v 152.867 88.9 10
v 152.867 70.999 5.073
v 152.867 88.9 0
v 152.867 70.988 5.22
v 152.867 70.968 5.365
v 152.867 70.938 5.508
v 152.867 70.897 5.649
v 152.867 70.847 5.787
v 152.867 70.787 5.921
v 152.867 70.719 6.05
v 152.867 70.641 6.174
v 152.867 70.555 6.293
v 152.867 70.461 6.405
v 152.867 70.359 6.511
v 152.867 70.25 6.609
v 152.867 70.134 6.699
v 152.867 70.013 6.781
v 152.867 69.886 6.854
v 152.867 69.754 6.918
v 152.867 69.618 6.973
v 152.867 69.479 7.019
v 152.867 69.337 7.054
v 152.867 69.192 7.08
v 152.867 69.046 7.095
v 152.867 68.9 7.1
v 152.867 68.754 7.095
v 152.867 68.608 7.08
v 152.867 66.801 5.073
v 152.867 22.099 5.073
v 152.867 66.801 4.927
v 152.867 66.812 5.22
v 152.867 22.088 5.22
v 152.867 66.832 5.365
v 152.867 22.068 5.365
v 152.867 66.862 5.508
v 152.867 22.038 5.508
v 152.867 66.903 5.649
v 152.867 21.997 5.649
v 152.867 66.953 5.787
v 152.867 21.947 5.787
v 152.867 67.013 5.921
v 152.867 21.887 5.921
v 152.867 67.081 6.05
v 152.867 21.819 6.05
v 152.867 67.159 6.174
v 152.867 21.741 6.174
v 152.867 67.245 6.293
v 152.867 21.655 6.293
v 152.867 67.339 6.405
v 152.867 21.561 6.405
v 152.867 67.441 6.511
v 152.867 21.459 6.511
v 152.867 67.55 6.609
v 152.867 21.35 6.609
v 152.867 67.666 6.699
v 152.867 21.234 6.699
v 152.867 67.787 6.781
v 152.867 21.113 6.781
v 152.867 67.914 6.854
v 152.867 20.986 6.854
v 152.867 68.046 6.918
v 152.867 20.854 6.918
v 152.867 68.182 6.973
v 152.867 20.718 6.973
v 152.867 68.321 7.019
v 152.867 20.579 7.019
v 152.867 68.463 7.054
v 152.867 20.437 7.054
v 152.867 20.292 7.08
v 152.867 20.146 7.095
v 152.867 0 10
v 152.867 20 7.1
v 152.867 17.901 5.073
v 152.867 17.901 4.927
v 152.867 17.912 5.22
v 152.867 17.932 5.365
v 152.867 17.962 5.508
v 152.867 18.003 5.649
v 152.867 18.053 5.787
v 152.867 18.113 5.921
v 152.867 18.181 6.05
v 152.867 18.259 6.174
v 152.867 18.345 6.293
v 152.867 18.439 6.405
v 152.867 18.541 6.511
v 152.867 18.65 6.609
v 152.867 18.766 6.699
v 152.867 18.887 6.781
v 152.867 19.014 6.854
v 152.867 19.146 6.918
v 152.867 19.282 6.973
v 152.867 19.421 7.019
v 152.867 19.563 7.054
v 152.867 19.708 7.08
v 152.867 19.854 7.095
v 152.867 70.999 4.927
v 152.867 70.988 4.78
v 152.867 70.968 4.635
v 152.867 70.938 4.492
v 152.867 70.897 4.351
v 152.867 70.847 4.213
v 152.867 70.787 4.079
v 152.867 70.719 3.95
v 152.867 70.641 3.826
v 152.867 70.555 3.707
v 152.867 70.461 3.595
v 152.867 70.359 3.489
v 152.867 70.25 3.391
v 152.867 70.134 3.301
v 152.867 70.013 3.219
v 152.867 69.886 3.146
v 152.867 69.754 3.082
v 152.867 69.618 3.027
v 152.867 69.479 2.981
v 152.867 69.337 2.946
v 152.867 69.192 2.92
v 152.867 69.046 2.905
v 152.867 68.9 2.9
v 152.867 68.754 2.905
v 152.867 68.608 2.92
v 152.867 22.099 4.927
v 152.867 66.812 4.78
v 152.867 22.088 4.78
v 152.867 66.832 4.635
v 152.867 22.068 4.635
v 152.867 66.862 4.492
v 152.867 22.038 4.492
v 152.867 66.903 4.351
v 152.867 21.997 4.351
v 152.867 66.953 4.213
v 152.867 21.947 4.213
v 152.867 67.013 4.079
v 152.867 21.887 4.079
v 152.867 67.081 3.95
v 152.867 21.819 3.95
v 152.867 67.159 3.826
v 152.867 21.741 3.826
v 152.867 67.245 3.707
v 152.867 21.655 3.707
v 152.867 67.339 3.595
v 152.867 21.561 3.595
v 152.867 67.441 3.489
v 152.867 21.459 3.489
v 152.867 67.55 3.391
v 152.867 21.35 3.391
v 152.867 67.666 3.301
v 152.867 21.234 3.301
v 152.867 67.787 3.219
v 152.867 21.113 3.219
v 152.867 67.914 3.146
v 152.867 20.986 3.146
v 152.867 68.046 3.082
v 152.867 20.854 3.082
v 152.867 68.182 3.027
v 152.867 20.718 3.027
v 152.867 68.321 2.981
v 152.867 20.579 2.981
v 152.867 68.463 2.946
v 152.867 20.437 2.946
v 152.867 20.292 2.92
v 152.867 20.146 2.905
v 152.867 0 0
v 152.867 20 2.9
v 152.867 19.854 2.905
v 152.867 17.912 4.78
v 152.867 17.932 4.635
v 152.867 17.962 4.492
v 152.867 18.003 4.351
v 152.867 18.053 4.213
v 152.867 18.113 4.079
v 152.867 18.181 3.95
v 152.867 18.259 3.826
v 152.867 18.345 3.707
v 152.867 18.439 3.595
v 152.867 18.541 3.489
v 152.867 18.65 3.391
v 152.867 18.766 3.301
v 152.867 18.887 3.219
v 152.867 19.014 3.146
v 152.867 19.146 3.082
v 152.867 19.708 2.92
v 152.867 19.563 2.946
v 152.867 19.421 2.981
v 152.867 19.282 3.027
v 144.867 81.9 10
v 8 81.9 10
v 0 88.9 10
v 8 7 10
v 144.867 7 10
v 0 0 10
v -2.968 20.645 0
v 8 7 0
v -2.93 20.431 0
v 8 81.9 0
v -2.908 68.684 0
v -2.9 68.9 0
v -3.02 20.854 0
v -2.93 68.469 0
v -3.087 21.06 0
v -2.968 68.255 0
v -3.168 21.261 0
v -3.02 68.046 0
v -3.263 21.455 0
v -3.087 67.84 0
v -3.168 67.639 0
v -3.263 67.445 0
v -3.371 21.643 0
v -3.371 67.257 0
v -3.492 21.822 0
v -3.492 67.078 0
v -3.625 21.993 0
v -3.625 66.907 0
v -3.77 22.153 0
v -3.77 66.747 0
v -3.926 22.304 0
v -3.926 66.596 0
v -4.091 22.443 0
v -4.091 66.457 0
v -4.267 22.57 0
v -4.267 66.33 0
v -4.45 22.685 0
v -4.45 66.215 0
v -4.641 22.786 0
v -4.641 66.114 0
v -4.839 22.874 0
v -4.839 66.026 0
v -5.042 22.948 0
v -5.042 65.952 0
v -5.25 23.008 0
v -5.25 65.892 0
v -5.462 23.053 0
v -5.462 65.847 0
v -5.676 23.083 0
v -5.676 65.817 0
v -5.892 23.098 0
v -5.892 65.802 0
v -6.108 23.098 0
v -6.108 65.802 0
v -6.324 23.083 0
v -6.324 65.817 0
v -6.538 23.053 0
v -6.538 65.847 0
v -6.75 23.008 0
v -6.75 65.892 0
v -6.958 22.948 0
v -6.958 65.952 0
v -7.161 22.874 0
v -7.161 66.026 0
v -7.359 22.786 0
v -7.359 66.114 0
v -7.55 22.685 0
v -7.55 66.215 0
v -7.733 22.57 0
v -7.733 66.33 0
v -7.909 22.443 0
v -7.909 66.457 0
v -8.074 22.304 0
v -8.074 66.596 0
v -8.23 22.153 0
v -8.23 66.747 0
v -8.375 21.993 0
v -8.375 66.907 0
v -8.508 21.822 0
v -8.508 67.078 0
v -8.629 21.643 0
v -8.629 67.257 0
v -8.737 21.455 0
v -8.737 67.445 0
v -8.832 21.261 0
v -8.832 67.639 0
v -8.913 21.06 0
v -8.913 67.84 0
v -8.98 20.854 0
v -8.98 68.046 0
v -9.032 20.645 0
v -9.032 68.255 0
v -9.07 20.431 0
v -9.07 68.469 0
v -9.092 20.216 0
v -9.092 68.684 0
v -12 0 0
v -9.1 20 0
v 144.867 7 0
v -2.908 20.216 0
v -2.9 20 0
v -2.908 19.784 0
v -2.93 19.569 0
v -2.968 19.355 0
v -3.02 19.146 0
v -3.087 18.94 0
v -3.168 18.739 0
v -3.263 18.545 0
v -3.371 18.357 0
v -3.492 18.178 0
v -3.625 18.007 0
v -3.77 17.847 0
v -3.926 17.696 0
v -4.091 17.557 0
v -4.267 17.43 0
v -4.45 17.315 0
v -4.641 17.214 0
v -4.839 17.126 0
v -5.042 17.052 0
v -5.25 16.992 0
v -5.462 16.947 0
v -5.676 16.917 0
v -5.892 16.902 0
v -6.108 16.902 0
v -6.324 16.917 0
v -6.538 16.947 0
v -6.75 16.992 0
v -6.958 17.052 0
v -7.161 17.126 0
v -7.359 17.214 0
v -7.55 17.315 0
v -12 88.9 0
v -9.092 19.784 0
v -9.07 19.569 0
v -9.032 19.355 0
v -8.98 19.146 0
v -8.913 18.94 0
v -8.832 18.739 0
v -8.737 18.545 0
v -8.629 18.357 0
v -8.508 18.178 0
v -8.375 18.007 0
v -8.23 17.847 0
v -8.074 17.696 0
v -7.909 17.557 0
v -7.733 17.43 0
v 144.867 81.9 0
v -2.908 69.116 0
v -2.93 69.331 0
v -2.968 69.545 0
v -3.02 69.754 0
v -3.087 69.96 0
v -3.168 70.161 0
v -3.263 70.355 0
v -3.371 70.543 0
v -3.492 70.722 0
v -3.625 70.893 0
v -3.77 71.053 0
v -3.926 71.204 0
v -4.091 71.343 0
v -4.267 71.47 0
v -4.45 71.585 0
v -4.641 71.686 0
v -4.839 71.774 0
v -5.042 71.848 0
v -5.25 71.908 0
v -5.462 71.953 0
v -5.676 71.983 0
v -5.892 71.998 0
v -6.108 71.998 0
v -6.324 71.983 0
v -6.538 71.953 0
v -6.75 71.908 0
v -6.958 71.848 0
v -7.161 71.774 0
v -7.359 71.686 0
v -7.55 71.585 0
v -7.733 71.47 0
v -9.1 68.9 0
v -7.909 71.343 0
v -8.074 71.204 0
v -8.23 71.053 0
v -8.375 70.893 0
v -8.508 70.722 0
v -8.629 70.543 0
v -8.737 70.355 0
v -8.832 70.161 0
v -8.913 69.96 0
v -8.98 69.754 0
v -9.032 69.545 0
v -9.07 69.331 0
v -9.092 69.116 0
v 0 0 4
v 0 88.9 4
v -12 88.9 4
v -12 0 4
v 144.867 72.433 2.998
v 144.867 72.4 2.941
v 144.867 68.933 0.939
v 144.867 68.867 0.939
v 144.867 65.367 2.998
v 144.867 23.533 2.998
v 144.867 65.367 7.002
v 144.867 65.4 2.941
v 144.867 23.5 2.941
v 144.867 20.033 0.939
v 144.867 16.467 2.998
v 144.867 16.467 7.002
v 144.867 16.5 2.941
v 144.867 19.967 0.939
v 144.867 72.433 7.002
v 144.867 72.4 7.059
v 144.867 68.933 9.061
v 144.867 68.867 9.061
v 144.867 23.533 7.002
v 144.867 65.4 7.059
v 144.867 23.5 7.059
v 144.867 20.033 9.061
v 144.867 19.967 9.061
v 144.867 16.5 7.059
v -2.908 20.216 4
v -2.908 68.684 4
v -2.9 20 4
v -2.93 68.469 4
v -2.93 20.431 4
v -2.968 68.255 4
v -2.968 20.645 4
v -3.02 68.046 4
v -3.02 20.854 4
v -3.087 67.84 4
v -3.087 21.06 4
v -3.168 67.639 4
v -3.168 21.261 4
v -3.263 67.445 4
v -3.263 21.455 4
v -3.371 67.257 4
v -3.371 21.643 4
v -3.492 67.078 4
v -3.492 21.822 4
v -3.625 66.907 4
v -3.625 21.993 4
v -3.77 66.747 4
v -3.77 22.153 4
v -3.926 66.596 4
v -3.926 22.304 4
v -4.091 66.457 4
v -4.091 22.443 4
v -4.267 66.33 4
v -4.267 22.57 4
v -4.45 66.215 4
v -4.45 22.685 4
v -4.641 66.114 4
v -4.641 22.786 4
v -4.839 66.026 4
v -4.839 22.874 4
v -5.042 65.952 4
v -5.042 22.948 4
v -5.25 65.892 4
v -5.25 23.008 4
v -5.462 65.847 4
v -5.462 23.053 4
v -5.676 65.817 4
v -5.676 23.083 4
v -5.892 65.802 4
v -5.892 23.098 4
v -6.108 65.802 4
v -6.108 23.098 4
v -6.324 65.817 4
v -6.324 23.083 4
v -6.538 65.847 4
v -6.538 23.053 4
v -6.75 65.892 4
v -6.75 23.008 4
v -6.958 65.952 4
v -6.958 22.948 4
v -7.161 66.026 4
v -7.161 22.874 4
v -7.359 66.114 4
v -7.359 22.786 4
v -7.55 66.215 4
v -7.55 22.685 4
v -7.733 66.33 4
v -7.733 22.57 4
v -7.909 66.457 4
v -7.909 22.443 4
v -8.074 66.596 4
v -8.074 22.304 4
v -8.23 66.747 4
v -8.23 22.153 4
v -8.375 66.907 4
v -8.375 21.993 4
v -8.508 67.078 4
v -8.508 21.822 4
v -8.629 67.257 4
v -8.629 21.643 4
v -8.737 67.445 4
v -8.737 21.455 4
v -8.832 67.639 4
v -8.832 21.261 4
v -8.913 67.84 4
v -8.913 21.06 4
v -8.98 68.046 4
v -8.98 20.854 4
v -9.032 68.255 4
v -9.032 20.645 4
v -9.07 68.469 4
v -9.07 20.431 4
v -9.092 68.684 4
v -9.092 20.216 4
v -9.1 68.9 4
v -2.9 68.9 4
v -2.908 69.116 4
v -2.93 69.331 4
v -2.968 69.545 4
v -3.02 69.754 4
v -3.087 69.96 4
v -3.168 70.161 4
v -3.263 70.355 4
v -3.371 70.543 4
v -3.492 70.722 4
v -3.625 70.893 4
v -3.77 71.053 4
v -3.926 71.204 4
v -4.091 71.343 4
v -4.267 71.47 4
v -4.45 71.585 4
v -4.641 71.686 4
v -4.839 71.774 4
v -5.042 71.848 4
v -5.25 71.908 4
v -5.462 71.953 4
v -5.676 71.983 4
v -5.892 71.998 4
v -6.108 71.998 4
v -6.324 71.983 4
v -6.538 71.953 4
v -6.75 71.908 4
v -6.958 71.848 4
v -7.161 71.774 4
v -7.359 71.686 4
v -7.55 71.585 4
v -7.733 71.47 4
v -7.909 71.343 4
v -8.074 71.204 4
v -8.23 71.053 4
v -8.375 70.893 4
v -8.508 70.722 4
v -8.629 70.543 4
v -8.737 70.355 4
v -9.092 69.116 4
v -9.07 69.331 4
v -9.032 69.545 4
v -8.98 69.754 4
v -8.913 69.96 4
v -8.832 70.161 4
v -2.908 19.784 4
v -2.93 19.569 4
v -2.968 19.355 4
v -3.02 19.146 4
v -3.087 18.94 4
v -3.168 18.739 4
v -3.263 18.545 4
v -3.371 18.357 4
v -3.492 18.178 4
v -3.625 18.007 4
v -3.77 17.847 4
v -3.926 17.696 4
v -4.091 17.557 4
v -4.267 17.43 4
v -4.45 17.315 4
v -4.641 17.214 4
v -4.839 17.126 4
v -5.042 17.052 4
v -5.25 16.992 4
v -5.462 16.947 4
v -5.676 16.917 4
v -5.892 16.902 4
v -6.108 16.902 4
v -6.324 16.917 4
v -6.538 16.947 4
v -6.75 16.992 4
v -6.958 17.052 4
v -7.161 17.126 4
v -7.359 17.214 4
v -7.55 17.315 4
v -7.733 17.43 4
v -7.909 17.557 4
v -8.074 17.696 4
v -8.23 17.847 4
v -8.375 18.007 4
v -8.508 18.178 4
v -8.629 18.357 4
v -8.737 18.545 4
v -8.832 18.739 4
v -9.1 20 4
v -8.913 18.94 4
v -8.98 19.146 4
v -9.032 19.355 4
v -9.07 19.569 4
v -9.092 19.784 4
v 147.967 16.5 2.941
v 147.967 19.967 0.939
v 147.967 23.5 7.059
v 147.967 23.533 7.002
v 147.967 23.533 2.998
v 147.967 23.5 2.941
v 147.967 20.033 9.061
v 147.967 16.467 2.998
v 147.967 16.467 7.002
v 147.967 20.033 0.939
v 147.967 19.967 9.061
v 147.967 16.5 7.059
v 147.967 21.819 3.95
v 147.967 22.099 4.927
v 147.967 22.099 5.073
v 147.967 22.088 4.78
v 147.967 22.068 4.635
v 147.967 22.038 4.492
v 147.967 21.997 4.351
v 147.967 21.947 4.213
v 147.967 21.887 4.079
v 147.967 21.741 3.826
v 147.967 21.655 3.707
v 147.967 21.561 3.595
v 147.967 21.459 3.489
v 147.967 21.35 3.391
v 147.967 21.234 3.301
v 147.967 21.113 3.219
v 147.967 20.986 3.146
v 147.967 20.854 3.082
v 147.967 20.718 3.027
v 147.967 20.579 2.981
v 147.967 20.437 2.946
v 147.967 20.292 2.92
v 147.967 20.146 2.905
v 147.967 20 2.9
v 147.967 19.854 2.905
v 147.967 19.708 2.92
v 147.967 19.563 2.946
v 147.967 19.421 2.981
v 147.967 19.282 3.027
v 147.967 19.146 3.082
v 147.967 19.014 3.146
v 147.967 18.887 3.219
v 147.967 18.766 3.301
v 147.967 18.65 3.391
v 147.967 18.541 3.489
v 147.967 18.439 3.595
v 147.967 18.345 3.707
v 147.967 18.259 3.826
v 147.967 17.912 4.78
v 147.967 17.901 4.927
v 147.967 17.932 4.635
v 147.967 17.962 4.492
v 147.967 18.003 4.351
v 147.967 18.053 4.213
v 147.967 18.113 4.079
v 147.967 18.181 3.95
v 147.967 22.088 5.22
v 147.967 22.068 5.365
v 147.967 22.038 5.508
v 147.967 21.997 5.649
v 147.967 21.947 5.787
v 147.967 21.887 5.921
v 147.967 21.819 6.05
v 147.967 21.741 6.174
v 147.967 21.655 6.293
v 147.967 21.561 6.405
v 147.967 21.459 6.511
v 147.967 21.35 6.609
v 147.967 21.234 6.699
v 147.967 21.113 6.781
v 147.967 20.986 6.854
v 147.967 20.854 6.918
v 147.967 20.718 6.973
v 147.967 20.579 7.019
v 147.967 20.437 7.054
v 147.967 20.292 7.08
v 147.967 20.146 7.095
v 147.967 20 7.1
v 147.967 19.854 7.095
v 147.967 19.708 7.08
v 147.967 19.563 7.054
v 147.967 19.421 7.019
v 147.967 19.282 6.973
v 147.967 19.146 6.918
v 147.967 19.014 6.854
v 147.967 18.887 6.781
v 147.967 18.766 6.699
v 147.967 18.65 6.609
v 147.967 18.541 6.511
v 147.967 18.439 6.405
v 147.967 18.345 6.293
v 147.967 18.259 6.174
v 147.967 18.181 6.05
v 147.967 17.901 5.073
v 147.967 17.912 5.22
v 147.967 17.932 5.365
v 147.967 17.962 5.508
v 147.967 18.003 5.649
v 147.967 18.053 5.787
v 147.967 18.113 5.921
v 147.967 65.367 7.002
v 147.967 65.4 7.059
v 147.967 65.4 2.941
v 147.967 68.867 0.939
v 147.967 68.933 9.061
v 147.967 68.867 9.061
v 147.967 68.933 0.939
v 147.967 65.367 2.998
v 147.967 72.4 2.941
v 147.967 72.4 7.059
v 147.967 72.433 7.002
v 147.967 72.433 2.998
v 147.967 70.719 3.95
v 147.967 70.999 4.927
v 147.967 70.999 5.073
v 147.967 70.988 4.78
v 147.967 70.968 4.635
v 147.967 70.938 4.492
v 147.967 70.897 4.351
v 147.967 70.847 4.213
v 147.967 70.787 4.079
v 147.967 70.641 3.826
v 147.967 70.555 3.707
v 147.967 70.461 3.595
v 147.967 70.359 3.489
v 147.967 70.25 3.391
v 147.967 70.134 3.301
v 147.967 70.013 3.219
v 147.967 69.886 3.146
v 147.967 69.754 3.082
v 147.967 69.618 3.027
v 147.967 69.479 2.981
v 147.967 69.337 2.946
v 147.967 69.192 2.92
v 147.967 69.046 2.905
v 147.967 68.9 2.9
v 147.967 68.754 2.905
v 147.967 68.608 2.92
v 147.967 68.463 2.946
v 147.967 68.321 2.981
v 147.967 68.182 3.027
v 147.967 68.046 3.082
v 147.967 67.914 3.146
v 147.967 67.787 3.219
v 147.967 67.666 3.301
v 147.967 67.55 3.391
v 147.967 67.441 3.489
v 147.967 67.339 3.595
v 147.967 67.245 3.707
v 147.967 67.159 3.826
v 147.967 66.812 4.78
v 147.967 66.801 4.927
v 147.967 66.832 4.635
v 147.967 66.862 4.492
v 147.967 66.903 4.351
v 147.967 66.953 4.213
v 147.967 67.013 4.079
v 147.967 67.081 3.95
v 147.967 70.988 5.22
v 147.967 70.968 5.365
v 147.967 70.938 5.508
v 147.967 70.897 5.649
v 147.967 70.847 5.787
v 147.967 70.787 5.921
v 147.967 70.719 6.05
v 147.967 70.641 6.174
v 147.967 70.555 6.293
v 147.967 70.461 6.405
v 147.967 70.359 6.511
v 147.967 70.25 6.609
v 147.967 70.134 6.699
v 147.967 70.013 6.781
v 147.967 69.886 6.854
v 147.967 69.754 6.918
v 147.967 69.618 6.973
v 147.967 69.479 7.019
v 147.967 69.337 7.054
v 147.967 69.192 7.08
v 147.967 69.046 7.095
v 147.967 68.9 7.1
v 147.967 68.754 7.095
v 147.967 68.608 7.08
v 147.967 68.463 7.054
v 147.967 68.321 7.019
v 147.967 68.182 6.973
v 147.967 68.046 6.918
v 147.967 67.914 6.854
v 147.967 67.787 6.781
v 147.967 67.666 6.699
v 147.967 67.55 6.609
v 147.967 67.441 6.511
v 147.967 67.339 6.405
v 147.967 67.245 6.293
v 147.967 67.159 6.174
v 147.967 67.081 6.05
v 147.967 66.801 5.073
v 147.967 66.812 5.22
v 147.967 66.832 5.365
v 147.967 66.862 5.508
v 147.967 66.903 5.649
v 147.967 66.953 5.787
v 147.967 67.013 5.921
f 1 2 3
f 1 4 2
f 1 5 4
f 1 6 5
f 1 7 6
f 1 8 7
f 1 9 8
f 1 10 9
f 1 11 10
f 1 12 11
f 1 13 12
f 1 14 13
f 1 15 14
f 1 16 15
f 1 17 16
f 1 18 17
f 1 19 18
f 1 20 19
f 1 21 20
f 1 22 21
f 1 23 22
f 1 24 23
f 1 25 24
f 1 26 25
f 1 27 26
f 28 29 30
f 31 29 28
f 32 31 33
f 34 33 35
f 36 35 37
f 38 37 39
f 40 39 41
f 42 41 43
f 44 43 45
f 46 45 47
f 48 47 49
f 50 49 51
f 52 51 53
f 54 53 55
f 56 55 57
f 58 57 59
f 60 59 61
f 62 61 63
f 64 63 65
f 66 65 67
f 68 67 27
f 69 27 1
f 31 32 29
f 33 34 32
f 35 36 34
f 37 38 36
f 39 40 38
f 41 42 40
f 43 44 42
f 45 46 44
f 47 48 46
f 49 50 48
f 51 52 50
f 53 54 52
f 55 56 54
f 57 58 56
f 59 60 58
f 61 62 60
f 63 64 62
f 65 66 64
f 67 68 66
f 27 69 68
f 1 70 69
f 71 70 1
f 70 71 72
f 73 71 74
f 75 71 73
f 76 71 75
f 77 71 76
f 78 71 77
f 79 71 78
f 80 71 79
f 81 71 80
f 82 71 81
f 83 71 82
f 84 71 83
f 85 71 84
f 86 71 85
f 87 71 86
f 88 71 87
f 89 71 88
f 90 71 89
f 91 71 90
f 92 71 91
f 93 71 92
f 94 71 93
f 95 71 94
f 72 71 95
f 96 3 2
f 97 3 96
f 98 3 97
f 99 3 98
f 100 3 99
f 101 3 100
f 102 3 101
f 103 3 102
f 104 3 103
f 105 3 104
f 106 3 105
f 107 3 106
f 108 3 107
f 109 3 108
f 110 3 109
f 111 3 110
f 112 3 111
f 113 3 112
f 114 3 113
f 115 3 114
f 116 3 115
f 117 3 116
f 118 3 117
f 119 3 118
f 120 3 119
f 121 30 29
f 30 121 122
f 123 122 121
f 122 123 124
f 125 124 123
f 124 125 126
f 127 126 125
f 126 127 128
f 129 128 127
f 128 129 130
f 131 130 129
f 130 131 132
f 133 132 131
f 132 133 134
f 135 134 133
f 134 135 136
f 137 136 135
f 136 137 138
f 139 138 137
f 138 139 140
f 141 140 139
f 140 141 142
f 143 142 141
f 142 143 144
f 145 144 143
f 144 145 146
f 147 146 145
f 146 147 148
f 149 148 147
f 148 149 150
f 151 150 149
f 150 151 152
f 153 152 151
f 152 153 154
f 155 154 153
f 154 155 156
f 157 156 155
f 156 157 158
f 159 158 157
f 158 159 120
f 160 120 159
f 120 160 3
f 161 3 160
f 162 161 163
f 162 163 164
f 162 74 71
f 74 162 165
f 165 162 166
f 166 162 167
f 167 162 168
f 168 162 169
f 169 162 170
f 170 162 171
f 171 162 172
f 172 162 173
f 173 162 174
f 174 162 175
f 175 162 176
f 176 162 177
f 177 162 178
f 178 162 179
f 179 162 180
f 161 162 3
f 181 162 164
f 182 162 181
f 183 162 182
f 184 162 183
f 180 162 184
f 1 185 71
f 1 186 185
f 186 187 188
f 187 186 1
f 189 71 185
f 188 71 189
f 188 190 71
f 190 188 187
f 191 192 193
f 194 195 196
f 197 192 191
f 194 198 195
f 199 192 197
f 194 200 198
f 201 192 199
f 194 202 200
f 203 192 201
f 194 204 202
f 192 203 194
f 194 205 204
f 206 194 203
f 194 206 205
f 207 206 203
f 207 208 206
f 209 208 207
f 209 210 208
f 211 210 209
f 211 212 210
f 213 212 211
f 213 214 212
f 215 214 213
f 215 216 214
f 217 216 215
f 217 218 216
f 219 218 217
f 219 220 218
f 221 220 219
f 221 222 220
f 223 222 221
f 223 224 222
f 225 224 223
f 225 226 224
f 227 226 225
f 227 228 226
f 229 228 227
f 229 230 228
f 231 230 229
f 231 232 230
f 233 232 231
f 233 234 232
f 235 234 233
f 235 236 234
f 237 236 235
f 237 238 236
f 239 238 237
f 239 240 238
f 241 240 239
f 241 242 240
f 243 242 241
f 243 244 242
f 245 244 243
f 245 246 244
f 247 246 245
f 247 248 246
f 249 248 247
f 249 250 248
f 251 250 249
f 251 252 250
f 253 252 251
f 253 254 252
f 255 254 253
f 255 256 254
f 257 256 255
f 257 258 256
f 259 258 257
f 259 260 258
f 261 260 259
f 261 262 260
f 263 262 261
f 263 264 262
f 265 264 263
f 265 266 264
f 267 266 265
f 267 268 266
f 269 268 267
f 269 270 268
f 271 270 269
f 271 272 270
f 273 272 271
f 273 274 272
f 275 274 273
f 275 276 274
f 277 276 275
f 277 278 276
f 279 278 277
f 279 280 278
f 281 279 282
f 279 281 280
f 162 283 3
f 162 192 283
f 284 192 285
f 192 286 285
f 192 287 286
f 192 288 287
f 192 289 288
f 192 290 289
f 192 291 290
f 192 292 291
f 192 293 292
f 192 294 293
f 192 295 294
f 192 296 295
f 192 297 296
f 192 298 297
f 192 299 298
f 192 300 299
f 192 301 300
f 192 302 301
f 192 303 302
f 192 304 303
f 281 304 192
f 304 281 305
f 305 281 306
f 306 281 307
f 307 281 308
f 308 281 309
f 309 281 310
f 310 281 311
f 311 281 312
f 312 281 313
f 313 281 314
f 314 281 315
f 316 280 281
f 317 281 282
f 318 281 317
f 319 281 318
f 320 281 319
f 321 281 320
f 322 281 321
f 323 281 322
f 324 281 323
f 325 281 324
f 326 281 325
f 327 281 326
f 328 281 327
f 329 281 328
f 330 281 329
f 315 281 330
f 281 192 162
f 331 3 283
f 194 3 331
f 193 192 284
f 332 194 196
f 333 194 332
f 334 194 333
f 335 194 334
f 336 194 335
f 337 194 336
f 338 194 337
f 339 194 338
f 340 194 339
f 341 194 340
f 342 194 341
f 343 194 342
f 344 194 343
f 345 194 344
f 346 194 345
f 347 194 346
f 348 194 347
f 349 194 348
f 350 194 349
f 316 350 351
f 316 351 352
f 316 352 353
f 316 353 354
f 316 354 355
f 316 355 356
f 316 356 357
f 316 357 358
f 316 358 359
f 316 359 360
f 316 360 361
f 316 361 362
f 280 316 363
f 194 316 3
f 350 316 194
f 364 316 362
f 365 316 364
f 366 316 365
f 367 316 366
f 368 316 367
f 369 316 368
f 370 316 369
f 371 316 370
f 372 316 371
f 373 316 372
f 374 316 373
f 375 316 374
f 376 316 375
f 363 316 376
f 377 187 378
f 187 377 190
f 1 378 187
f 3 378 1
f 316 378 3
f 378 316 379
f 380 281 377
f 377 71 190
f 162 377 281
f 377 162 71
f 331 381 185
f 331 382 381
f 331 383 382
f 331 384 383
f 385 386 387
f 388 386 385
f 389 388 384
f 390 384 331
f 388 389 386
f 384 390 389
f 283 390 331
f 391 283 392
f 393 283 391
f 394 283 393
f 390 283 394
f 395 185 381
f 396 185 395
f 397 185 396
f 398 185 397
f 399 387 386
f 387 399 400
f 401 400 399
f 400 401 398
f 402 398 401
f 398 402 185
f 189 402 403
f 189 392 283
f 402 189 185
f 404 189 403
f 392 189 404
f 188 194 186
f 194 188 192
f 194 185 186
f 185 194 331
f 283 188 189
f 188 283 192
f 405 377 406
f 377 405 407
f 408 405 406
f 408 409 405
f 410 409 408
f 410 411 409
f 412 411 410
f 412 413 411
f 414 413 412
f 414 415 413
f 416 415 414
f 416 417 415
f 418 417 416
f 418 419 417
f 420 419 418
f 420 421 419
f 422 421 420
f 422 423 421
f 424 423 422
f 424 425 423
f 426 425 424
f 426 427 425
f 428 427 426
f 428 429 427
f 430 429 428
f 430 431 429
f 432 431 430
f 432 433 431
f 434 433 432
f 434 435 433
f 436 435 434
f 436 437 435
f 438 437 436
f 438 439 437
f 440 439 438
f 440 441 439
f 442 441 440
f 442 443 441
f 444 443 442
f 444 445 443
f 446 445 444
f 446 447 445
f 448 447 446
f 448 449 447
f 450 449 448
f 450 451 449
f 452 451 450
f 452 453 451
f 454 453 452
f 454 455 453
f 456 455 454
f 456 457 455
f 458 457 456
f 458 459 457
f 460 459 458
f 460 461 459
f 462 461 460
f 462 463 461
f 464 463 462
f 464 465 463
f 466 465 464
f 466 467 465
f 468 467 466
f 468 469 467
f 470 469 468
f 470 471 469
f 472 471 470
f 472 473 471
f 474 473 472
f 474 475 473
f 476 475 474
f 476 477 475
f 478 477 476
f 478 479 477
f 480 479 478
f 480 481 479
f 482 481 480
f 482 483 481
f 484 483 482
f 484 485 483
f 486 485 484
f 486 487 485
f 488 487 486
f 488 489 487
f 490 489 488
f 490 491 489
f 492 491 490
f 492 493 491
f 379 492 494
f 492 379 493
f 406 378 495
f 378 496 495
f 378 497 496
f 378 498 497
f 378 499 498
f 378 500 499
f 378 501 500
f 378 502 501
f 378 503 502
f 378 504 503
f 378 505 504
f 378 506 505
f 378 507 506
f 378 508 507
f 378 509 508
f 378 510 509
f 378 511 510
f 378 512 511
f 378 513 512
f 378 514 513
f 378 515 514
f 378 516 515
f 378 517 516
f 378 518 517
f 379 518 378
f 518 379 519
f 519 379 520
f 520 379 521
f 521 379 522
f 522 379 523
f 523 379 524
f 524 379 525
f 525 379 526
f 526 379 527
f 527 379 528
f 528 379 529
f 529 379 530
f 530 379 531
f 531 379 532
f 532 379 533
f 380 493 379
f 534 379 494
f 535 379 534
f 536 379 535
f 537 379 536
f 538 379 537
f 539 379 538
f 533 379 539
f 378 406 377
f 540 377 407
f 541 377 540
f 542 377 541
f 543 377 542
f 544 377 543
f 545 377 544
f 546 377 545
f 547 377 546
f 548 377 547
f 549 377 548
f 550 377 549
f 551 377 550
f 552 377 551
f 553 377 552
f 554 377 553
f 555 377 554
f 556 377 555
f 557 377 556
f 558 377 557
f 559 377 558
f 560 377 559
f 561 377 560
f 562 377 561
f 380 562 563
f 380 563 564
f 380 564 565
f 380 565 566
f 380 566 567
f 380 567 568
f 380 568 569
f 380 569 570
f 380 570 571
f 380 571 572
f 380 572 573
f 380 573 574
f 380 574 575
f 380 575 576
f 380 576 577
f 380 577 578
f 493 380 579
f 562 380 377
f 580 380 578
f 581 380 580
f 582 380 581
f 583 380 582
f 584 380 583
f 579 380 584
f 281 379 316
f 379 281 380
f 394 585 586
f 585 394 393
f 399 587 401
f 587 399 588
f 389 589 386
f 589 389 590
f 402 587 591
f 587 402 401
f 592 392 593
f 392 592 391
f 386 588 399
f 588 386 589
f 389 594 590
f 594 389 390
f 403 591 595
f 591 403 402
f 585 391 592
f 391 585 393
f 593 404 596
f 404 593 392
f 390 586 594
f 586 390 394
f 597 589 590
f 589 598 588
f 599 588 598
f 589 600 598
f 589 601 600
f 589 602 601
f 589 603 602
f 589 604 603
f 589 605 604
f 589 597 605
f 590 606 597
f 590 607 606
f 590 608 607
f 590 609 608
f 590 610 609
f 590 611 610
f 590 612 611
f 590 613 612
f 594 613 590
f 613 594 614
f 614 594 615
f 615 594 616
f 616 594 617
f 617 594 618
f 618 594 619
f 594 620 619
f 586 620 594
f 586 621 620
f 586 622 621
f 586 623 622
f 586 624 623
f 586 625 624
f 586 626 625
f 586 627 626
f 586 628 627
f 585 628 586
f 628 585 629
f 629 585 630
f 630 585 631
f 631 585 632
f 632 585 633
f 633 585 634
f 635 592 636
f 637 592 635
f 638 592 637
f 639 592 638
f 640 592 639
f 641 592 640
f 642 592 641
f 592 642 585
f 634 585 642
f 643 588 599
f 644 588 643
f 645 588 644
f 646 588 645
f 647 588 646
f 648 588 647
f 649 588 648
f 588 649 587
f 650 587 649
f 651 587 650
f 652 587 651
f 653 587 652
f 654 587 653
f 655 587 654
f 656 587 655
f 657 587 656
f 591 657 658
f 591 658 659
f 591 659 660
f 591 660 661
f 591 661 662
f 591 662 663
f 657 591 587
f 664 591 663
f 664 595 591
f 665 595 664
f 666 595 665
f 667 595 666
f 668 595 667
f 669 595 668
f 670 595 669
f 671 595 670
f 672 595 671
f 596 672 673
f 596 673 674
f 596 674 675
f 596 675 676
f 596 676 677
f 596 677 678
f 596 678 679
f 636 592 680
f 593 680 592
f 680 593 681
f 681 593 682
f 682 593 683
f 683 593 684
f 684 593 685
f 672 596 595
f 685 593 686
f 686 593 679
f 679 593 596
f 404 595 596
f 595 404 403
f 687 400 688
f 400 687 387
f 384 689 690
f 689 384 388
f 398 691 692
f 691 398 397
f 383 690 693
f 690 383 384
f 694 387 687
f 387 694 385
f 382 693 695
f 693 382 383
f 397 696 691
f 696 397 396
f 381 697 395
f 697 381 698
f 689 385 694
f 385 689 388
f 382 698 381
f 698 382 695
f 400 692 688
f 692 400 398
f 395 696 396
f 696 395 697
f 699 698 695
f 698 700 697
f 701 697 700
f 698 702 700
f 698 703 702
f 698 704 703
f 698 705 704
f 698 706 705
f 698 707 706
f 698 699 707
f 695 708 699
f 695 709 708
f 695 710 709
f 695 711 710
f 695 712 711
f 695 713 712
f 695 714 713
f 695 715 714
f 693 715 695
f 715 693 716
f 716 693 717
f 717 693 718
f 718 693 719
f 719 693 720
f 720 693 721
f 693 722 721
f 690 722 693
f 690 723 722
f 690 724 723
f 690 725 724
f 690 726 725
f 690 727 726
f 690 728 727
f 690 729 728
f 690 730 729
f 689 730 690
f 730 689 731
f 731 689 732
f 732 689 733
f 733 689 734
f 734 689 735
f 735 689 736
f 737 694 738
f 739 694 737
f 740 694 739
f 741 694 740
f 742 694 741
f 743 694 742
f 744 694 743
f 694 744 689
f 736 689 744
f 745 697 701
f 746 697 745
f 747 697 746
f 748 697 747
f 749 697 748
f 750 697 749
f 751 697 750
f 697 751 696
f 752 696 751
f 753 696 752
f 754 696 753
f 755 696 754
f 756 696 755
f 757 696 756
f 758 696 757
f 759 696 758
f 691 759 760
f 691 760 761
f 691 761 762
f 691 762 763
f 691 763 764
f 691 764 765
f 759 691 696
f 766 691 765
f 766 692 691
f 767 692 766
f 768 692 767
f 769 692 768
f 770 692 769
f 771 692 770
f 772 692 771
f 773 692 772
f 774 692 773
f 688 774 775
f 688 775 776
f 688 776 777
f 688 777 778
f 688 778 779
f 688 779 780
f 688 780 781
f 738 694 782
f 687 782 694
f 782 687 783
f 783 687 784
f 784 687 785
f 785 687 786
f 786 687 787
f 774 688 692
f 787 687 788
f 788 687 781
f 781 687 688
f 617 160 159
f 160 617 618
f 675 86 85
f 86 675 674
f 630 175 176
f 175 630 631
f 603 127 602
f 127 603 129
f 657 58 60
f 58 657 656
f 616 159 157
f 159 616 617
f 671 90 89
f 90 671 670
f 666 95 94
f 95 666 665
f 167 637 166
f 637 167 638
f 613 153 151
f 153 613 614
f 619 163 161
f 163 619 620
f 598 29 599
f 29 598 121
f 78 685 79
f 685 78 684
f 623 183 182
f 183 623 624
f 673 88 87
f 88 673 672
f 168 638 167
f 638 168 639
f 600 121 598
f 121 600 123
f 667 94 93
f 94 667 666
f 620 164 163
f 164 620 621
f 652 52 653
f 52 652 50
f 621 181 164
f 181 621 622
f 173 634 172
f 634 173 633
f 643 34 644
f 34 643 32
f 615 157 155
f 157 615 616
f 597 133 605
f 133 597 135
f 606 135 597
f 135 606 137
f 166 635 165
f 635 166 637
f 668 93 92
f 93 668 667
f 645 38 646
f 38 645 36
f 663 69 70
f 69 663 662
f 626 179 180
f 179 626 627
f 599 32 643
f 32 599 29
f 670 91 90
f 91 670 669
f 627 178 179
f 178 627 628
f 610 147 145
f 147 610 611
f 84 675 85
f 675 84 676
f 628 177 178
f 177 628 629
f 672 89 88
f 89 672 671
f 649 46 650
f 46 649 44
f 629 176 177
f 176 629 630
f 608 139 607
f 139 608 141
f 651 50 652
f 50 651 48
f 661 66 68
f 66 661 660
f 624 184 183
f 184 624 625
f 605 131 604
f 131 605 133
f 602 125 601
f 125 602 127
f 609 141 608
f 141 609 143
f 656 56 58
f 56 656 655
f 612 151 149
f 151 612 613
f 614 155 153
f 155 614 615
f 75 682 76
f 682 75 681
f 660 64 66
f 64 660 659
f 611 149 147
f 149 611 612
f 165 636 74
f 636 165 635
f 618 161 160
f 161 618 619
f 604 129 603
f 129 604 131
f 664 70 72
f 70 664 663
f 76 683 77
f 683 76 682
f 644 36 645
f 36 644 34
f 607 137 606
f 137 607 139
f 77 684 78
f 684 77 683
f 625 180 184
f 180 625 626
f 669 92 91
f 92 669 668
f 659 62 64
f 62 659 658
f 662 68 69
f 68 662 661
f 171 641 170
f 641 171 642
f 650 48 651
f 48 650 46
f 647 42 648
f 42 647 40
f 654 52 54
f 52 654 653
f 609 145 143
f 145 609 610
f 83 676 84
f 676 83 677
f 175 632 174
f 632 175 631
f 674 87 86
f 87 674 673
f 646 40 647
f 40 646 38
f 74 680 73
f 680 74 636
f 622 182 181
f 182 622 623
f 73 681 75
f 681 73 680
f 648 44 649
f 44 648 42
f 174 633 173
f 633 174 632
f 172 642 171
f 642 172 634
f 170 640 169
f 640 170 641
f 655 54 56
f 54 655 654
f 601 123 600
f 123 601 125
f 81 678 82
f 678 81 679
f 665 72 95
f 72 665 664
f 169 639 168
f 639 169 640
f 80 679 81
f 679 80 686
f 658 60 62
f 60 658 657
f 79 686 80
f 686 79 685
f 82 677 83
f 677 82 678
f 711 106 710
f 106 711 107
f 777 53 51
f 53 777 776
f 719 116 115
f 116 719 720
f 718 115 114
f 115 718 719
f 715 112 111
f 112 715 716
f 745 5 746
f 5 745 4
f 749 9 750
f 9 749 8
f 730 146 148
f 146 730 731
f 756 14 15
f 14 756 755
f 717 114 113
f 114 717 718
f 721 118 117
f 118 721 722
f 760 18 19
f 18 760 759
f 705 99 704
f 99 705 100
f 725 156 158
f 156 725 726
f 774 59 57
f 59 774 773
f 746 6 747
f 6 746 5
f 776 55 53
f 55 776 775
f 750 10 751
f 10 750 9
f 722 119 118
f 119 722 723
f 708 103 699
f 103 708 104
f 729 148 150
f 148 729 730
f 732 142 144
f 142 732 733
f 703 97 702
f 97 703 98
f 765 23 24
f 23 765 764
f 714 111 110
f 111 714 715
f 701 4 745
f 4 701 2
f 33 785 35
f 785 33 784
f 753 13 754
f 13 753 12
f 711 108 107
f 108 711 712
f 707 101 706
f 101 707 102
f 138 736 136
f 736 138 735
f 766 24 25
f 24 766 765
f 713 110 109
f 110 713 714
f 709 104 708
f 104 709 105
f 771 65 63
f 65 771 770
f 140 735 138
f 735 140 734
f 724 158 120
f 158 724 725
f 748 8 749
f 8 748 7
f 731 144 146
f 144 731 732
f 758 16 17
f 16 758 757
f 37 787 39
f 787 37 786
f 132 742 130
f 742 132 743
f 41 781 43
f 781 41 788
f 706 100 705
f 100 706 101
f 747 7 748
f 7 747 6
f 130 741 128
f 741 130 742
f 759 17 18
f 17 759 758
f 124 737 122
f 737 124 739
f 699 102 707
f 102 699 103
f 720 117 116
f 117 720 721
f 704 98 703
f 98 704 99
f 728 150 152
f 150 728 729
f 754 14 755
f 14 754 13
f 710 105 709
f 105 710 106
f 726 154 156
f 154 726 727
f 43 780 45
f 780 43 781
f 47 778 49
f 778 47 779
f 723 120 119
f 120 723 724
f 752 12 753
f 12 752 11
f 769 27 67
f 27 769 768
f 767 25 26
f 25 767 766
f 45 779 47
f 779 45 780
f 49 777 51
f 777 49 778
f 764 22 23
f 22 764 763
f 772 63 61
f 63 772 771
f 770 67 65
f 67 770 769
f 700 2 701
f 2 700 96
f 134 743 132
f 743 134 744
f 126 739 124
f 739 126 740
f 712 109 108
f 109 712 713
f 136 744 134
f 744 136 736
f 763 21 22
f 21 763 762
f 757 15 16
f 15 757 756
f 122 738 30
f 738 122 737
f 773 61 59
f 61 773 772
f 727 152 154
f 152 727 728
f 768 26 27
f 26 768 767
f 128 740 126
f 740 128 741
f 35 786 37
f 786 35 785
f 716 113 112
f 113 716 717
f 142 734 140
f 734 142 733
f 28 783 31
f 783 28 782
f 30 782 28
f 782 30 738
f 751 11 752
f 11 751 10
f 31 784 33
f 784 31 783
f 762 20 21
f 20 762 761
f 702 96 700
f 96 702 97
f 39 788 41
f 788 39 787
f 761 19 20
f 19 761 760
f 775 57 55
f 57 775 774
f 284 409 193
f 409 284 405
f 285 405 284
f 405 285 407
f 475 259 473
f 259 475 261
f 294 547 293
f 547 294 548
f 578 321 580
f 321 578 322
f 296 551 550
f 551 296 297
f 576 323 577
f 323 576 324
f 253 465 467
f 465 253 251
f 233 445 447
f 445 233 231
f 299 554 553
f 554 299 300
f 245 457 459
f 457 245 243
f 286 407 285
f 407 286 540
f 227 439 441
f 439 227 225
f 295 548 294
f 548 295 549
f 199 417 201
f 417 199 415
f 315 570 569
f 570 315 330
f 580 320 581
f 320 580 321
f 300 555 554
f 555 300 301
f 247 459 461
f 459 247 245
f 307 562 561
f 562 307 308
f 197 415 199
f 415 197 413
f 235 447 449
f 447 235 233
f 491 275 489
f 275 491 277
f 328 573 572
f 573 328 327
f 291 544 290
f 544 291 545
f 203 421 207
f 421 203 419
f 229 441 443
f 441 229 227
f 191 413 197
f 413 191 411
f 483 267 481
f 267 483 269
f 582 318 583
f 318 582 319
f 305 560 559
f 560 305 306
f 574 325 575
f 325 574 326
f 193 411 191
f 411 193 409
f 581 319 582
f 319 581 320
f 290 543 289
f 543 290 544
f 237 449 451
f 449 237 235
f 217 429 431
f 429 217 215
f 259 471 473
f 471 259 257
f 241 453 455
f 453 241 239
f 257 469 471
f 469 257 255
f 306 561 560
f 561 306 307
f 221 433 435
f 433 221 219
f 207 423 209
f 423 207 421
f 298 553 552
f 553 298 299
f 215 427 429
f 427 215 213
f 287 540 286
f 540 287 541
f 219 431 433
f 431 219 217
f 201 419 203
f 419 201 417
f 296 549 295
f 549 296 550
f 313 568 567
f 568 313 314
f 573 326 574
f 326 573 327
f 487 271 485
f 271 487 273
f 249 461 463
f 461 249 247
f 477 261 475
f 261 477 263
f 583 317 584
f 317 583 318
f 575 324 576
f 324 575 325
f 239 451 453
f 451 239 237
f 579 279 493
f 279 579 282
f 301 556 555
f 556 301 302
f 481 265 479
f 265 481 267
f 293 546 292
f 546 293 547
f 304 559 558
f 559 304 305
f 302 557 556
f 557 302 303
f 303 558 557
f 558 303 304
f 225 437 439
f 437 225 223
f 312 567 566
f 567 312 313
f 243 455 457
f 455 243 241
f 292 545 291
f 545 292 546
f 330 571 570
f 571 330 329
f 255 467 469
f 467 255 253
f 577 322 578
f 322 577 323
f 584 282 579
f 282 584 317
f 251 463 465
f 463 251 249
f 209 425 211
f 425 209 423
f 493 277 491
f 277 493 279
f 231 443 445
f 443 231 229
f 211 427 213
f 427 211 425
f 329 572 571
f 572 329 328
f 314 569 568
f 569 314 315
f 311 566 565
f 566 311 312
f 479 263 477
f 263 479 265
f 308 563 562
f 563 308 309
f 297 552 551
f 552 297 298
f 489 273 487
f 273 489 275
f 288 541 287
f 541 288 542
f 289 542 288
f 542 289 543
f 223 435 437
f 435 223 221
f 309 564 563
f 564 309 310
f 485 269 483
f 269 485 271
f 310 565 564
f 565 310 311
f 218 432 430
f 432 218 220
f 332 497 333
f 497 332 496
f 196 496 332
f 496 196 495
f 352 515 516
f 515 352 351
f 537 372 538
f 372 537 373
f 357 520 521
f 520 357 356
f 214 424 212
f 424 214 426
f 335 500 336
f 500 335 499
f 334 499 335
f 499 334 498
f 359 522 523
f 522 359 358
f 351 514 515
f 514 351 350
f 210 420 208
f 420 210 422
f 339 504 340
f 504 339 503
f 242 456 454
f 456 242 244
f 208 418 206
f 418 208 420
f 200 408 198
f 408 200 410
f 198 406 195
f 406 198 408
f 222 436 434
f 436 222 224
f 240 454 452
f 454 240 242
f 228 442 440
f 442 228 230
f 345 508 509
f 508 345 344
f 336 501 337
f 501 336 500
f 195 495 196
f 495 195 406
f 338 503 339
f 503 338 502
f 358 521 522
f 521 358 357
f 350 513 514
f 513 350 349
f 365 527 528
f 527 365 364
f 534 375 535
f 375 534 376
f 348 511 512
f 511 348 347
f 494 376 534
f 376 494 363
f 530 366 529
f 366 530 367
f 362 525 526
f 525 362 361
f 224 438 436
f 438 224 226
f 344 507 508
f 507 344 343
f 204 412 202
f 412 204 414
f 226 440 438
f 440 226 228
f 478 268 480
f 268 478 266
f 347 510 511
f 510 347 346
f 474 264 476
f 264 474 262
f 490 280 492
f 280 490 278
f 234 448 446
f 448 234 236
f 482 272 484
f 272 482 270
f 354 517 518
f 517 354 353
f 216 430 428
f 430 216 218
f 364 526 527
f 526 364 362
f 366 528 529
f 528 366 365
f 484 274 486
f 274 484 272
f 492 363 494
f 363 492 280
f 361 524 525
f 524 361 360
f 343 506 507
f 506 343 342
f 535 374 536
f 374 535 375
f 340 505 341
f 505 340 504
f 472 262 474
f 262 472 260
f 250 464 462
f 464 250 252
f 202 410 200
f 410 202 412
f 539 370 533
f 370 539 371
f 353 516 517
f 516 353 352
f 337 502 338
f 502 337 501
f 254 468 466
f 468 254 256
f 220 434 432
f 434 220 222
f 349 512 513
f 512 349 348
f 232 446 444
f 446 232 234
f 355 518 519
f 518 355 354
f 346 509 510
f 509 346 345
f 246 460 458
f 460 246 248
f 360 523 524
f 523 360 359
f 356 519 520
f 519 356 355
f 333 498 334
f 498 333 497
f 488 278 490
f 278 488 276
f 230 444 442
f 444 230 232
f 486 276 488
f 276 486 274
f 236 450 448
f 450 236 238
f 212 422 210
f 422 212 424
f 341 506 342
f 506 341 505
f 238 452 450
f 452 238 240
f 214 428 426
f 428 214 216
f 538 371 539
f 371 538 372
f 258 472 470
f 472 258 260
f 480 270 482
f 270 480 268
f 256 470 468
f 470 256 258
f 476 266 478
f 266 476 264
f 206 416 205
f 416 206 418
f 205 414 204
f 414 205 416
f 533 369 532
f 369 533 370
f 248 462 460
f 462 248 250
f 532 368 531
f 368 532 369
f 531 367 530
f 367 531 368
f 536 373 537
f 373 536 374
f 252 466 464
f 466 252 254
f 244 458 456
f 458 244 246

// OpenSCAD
$fn=90;  // accuracy

// Fundemental
tw = 482.6; // total width
u1 = 44.45; // one server unit
u2 = u1*2;  // two server unit

// Fundational
wt  = 7;  // wall thickness 
wts = 8;  // wall thickness side
ct  = 10; // case thickenss
mt  = 4; // mount tikness
mw  = 12; // mount width
mhr = 6;  // mounting holes rack (d)
mhc = 4;  // mounting holes case (d)
mhn = 3;  // mounting holes node (d)
nt  = 3*13; // nodes total 

// Spesific
cw  = (tw-mw*2)/3; // case width
icw = cw-wts*2;  // inner case width
npc = nt/3;  // nodes per case
n1  = icw/npc;   // node (ssd + extra) (~10)
n3  = n1*3;      // node (pi + extra)
nw  = u2-wt*2; // node width
nmt = 3; // node mouting thickness

module ssdMount(n1,u2,nw,nmt){
   w = 69.9; // width
   d = 100; // depth
   h = 7;  // height
   
   hsp = 4+nw-w; // hole side position
   hbp = 14; // hole back position
   hfp = d-10; // hole front position
   
   hd = 3; // hole diameter
   hde = hd+3;// hole diameter extra
   
   s=0.1;
   s2=s*2; 
   e=1;
   
   sw = 20; // stableser width
     
   difference(){
   union(){
   cube([nw,d,nmt]);
       
   cube([nw,sw,n1]);
       
   translate([(nw-u2)/2,-nmt,0])
   cube([u2,nmt,n1]);
   
   }
   union(){    
   translate([hsp,hbp,-0.1])
   cylinder(h=nmt+0.2,d2=hd,d1=hde);
   translate([nw-hsp,hbp,-0.1])
   cylinder(h=nmt+0.2,d2=hd,d1=hde);    
   translate([hsp,hfp,-0.1])
   cylinder(h=nmt+0.2,d2=hd,d1=hde);
   translate([nw-hsp,hfp,-0.1])
   cylinder(h=nmt+0.2,d2=hd,d1=hde);    
   
   translate([(nw-w)/2,-(nmt+s),nmt])
   cube([w+e,d,nw]);
   }
   }
 
}

module case(icw,cw,u2,nw,ct){
    w = cw;
    iw = icw;
    d = u2;
    id = nw;
    h = ct;
    
    s=0.1;
    s2=s*2; 
    
    difference(){
    cube([w,d,h]);
     
    translate([(w-iw)/2,(d-id)/2,-s])
    cube([iw,id,h+s2]);
    }
}

module fhex(wid,height){
hull(){
cube([wid/1.7,wid,height],center = true);

rotate([0,0,120])
cube([wid/1.7,wid,height],center = true);

rotate([0,0,240])
cube([wid/1.7,wid,height],center = true);
}}

module caseSide(icw,cw,u2,nw,ct,mw,mt){   
    wmm4 = 7; // m4 mutter width
    hmm4 = 3.2; // height mutter m8
    fs = 20; // from side
    // possiotion of 
    m4 = 4.2; //screw
    cs = m4+3; // counter sink
    csd = 3;//counder sink depth
    s=0.1;
    s2=s*2;
    depth = (cw-icw)/2-csd;
    
    module h(y){
    rotate([0,90,0])
    translate([-ct/2,y,icw])
    cylinder(h=20,d=m4);
    }
    
    module m(y){
    space = cw-(cw-icw)/2+hmm4/2-0.1;
    rotate([0,90,0])
    translate([-ct/2,y,space])
    fhex(wmm4,hmm4);
    }
    
    module mh(y){
    translate([-mw/2,y,-0.1])
    cylinder(h=mt+0.2,d=6.2);
    }
    
    difference(){
    union(){
    case(icw,cw,u2,nw,ct);
        
    translate([-mw,0,0])
    cube([mw,u2,mt]);
    }
    
    union(){
    m(fs);
    m(u2-fs);
    h(fs);
    h(u2-fs);
    mh(fs); //change
    mh(u2-fs);    
    }}
}

module caseMiddle(icw,cw,u2,nw,ct){
    m4 = 4.2; //screw
    fs = 20; // from side
    cs = m4+3; // counter sink
    csd = 3;//counder sink depth
    s=0.1;
    s2=s*2;
    depth = (cw-icw)/2-csd;
    
    module h(y){
    rotate([0,90,0])
    translate([-ct/2,y,-s])
    cylinder(h=cw+s2,d=m4);
    }
    
    module c(y,z,d1,d2){
    rotate([0,90,0])
    translate([-mt/2,y,z])
    cylinder(h=csd+s,d1=d1,d2=d2);
    }
    
    difference(){
    case(icw,cw,u2,nw,ct);
        
    union(){
    h(fs);    
    h(u2-fs);
    c(fs,depth,m4,cs);
    c(u2-fs,depth,m4,cs);
    c(fs,cw-depth-csd-s,cs,m4);
    c(u2-fs,cw-depth-csd-s,cs,m4);
    }}
}

//ssdMount(n1,u2,nw,nmt);
//case(icw,cw,u2,nw,ct);
caseSide(icw,cw,u2,nw,ct,mw,mt);
//caseMiddle(icw,cw,u2,nw,ct);
